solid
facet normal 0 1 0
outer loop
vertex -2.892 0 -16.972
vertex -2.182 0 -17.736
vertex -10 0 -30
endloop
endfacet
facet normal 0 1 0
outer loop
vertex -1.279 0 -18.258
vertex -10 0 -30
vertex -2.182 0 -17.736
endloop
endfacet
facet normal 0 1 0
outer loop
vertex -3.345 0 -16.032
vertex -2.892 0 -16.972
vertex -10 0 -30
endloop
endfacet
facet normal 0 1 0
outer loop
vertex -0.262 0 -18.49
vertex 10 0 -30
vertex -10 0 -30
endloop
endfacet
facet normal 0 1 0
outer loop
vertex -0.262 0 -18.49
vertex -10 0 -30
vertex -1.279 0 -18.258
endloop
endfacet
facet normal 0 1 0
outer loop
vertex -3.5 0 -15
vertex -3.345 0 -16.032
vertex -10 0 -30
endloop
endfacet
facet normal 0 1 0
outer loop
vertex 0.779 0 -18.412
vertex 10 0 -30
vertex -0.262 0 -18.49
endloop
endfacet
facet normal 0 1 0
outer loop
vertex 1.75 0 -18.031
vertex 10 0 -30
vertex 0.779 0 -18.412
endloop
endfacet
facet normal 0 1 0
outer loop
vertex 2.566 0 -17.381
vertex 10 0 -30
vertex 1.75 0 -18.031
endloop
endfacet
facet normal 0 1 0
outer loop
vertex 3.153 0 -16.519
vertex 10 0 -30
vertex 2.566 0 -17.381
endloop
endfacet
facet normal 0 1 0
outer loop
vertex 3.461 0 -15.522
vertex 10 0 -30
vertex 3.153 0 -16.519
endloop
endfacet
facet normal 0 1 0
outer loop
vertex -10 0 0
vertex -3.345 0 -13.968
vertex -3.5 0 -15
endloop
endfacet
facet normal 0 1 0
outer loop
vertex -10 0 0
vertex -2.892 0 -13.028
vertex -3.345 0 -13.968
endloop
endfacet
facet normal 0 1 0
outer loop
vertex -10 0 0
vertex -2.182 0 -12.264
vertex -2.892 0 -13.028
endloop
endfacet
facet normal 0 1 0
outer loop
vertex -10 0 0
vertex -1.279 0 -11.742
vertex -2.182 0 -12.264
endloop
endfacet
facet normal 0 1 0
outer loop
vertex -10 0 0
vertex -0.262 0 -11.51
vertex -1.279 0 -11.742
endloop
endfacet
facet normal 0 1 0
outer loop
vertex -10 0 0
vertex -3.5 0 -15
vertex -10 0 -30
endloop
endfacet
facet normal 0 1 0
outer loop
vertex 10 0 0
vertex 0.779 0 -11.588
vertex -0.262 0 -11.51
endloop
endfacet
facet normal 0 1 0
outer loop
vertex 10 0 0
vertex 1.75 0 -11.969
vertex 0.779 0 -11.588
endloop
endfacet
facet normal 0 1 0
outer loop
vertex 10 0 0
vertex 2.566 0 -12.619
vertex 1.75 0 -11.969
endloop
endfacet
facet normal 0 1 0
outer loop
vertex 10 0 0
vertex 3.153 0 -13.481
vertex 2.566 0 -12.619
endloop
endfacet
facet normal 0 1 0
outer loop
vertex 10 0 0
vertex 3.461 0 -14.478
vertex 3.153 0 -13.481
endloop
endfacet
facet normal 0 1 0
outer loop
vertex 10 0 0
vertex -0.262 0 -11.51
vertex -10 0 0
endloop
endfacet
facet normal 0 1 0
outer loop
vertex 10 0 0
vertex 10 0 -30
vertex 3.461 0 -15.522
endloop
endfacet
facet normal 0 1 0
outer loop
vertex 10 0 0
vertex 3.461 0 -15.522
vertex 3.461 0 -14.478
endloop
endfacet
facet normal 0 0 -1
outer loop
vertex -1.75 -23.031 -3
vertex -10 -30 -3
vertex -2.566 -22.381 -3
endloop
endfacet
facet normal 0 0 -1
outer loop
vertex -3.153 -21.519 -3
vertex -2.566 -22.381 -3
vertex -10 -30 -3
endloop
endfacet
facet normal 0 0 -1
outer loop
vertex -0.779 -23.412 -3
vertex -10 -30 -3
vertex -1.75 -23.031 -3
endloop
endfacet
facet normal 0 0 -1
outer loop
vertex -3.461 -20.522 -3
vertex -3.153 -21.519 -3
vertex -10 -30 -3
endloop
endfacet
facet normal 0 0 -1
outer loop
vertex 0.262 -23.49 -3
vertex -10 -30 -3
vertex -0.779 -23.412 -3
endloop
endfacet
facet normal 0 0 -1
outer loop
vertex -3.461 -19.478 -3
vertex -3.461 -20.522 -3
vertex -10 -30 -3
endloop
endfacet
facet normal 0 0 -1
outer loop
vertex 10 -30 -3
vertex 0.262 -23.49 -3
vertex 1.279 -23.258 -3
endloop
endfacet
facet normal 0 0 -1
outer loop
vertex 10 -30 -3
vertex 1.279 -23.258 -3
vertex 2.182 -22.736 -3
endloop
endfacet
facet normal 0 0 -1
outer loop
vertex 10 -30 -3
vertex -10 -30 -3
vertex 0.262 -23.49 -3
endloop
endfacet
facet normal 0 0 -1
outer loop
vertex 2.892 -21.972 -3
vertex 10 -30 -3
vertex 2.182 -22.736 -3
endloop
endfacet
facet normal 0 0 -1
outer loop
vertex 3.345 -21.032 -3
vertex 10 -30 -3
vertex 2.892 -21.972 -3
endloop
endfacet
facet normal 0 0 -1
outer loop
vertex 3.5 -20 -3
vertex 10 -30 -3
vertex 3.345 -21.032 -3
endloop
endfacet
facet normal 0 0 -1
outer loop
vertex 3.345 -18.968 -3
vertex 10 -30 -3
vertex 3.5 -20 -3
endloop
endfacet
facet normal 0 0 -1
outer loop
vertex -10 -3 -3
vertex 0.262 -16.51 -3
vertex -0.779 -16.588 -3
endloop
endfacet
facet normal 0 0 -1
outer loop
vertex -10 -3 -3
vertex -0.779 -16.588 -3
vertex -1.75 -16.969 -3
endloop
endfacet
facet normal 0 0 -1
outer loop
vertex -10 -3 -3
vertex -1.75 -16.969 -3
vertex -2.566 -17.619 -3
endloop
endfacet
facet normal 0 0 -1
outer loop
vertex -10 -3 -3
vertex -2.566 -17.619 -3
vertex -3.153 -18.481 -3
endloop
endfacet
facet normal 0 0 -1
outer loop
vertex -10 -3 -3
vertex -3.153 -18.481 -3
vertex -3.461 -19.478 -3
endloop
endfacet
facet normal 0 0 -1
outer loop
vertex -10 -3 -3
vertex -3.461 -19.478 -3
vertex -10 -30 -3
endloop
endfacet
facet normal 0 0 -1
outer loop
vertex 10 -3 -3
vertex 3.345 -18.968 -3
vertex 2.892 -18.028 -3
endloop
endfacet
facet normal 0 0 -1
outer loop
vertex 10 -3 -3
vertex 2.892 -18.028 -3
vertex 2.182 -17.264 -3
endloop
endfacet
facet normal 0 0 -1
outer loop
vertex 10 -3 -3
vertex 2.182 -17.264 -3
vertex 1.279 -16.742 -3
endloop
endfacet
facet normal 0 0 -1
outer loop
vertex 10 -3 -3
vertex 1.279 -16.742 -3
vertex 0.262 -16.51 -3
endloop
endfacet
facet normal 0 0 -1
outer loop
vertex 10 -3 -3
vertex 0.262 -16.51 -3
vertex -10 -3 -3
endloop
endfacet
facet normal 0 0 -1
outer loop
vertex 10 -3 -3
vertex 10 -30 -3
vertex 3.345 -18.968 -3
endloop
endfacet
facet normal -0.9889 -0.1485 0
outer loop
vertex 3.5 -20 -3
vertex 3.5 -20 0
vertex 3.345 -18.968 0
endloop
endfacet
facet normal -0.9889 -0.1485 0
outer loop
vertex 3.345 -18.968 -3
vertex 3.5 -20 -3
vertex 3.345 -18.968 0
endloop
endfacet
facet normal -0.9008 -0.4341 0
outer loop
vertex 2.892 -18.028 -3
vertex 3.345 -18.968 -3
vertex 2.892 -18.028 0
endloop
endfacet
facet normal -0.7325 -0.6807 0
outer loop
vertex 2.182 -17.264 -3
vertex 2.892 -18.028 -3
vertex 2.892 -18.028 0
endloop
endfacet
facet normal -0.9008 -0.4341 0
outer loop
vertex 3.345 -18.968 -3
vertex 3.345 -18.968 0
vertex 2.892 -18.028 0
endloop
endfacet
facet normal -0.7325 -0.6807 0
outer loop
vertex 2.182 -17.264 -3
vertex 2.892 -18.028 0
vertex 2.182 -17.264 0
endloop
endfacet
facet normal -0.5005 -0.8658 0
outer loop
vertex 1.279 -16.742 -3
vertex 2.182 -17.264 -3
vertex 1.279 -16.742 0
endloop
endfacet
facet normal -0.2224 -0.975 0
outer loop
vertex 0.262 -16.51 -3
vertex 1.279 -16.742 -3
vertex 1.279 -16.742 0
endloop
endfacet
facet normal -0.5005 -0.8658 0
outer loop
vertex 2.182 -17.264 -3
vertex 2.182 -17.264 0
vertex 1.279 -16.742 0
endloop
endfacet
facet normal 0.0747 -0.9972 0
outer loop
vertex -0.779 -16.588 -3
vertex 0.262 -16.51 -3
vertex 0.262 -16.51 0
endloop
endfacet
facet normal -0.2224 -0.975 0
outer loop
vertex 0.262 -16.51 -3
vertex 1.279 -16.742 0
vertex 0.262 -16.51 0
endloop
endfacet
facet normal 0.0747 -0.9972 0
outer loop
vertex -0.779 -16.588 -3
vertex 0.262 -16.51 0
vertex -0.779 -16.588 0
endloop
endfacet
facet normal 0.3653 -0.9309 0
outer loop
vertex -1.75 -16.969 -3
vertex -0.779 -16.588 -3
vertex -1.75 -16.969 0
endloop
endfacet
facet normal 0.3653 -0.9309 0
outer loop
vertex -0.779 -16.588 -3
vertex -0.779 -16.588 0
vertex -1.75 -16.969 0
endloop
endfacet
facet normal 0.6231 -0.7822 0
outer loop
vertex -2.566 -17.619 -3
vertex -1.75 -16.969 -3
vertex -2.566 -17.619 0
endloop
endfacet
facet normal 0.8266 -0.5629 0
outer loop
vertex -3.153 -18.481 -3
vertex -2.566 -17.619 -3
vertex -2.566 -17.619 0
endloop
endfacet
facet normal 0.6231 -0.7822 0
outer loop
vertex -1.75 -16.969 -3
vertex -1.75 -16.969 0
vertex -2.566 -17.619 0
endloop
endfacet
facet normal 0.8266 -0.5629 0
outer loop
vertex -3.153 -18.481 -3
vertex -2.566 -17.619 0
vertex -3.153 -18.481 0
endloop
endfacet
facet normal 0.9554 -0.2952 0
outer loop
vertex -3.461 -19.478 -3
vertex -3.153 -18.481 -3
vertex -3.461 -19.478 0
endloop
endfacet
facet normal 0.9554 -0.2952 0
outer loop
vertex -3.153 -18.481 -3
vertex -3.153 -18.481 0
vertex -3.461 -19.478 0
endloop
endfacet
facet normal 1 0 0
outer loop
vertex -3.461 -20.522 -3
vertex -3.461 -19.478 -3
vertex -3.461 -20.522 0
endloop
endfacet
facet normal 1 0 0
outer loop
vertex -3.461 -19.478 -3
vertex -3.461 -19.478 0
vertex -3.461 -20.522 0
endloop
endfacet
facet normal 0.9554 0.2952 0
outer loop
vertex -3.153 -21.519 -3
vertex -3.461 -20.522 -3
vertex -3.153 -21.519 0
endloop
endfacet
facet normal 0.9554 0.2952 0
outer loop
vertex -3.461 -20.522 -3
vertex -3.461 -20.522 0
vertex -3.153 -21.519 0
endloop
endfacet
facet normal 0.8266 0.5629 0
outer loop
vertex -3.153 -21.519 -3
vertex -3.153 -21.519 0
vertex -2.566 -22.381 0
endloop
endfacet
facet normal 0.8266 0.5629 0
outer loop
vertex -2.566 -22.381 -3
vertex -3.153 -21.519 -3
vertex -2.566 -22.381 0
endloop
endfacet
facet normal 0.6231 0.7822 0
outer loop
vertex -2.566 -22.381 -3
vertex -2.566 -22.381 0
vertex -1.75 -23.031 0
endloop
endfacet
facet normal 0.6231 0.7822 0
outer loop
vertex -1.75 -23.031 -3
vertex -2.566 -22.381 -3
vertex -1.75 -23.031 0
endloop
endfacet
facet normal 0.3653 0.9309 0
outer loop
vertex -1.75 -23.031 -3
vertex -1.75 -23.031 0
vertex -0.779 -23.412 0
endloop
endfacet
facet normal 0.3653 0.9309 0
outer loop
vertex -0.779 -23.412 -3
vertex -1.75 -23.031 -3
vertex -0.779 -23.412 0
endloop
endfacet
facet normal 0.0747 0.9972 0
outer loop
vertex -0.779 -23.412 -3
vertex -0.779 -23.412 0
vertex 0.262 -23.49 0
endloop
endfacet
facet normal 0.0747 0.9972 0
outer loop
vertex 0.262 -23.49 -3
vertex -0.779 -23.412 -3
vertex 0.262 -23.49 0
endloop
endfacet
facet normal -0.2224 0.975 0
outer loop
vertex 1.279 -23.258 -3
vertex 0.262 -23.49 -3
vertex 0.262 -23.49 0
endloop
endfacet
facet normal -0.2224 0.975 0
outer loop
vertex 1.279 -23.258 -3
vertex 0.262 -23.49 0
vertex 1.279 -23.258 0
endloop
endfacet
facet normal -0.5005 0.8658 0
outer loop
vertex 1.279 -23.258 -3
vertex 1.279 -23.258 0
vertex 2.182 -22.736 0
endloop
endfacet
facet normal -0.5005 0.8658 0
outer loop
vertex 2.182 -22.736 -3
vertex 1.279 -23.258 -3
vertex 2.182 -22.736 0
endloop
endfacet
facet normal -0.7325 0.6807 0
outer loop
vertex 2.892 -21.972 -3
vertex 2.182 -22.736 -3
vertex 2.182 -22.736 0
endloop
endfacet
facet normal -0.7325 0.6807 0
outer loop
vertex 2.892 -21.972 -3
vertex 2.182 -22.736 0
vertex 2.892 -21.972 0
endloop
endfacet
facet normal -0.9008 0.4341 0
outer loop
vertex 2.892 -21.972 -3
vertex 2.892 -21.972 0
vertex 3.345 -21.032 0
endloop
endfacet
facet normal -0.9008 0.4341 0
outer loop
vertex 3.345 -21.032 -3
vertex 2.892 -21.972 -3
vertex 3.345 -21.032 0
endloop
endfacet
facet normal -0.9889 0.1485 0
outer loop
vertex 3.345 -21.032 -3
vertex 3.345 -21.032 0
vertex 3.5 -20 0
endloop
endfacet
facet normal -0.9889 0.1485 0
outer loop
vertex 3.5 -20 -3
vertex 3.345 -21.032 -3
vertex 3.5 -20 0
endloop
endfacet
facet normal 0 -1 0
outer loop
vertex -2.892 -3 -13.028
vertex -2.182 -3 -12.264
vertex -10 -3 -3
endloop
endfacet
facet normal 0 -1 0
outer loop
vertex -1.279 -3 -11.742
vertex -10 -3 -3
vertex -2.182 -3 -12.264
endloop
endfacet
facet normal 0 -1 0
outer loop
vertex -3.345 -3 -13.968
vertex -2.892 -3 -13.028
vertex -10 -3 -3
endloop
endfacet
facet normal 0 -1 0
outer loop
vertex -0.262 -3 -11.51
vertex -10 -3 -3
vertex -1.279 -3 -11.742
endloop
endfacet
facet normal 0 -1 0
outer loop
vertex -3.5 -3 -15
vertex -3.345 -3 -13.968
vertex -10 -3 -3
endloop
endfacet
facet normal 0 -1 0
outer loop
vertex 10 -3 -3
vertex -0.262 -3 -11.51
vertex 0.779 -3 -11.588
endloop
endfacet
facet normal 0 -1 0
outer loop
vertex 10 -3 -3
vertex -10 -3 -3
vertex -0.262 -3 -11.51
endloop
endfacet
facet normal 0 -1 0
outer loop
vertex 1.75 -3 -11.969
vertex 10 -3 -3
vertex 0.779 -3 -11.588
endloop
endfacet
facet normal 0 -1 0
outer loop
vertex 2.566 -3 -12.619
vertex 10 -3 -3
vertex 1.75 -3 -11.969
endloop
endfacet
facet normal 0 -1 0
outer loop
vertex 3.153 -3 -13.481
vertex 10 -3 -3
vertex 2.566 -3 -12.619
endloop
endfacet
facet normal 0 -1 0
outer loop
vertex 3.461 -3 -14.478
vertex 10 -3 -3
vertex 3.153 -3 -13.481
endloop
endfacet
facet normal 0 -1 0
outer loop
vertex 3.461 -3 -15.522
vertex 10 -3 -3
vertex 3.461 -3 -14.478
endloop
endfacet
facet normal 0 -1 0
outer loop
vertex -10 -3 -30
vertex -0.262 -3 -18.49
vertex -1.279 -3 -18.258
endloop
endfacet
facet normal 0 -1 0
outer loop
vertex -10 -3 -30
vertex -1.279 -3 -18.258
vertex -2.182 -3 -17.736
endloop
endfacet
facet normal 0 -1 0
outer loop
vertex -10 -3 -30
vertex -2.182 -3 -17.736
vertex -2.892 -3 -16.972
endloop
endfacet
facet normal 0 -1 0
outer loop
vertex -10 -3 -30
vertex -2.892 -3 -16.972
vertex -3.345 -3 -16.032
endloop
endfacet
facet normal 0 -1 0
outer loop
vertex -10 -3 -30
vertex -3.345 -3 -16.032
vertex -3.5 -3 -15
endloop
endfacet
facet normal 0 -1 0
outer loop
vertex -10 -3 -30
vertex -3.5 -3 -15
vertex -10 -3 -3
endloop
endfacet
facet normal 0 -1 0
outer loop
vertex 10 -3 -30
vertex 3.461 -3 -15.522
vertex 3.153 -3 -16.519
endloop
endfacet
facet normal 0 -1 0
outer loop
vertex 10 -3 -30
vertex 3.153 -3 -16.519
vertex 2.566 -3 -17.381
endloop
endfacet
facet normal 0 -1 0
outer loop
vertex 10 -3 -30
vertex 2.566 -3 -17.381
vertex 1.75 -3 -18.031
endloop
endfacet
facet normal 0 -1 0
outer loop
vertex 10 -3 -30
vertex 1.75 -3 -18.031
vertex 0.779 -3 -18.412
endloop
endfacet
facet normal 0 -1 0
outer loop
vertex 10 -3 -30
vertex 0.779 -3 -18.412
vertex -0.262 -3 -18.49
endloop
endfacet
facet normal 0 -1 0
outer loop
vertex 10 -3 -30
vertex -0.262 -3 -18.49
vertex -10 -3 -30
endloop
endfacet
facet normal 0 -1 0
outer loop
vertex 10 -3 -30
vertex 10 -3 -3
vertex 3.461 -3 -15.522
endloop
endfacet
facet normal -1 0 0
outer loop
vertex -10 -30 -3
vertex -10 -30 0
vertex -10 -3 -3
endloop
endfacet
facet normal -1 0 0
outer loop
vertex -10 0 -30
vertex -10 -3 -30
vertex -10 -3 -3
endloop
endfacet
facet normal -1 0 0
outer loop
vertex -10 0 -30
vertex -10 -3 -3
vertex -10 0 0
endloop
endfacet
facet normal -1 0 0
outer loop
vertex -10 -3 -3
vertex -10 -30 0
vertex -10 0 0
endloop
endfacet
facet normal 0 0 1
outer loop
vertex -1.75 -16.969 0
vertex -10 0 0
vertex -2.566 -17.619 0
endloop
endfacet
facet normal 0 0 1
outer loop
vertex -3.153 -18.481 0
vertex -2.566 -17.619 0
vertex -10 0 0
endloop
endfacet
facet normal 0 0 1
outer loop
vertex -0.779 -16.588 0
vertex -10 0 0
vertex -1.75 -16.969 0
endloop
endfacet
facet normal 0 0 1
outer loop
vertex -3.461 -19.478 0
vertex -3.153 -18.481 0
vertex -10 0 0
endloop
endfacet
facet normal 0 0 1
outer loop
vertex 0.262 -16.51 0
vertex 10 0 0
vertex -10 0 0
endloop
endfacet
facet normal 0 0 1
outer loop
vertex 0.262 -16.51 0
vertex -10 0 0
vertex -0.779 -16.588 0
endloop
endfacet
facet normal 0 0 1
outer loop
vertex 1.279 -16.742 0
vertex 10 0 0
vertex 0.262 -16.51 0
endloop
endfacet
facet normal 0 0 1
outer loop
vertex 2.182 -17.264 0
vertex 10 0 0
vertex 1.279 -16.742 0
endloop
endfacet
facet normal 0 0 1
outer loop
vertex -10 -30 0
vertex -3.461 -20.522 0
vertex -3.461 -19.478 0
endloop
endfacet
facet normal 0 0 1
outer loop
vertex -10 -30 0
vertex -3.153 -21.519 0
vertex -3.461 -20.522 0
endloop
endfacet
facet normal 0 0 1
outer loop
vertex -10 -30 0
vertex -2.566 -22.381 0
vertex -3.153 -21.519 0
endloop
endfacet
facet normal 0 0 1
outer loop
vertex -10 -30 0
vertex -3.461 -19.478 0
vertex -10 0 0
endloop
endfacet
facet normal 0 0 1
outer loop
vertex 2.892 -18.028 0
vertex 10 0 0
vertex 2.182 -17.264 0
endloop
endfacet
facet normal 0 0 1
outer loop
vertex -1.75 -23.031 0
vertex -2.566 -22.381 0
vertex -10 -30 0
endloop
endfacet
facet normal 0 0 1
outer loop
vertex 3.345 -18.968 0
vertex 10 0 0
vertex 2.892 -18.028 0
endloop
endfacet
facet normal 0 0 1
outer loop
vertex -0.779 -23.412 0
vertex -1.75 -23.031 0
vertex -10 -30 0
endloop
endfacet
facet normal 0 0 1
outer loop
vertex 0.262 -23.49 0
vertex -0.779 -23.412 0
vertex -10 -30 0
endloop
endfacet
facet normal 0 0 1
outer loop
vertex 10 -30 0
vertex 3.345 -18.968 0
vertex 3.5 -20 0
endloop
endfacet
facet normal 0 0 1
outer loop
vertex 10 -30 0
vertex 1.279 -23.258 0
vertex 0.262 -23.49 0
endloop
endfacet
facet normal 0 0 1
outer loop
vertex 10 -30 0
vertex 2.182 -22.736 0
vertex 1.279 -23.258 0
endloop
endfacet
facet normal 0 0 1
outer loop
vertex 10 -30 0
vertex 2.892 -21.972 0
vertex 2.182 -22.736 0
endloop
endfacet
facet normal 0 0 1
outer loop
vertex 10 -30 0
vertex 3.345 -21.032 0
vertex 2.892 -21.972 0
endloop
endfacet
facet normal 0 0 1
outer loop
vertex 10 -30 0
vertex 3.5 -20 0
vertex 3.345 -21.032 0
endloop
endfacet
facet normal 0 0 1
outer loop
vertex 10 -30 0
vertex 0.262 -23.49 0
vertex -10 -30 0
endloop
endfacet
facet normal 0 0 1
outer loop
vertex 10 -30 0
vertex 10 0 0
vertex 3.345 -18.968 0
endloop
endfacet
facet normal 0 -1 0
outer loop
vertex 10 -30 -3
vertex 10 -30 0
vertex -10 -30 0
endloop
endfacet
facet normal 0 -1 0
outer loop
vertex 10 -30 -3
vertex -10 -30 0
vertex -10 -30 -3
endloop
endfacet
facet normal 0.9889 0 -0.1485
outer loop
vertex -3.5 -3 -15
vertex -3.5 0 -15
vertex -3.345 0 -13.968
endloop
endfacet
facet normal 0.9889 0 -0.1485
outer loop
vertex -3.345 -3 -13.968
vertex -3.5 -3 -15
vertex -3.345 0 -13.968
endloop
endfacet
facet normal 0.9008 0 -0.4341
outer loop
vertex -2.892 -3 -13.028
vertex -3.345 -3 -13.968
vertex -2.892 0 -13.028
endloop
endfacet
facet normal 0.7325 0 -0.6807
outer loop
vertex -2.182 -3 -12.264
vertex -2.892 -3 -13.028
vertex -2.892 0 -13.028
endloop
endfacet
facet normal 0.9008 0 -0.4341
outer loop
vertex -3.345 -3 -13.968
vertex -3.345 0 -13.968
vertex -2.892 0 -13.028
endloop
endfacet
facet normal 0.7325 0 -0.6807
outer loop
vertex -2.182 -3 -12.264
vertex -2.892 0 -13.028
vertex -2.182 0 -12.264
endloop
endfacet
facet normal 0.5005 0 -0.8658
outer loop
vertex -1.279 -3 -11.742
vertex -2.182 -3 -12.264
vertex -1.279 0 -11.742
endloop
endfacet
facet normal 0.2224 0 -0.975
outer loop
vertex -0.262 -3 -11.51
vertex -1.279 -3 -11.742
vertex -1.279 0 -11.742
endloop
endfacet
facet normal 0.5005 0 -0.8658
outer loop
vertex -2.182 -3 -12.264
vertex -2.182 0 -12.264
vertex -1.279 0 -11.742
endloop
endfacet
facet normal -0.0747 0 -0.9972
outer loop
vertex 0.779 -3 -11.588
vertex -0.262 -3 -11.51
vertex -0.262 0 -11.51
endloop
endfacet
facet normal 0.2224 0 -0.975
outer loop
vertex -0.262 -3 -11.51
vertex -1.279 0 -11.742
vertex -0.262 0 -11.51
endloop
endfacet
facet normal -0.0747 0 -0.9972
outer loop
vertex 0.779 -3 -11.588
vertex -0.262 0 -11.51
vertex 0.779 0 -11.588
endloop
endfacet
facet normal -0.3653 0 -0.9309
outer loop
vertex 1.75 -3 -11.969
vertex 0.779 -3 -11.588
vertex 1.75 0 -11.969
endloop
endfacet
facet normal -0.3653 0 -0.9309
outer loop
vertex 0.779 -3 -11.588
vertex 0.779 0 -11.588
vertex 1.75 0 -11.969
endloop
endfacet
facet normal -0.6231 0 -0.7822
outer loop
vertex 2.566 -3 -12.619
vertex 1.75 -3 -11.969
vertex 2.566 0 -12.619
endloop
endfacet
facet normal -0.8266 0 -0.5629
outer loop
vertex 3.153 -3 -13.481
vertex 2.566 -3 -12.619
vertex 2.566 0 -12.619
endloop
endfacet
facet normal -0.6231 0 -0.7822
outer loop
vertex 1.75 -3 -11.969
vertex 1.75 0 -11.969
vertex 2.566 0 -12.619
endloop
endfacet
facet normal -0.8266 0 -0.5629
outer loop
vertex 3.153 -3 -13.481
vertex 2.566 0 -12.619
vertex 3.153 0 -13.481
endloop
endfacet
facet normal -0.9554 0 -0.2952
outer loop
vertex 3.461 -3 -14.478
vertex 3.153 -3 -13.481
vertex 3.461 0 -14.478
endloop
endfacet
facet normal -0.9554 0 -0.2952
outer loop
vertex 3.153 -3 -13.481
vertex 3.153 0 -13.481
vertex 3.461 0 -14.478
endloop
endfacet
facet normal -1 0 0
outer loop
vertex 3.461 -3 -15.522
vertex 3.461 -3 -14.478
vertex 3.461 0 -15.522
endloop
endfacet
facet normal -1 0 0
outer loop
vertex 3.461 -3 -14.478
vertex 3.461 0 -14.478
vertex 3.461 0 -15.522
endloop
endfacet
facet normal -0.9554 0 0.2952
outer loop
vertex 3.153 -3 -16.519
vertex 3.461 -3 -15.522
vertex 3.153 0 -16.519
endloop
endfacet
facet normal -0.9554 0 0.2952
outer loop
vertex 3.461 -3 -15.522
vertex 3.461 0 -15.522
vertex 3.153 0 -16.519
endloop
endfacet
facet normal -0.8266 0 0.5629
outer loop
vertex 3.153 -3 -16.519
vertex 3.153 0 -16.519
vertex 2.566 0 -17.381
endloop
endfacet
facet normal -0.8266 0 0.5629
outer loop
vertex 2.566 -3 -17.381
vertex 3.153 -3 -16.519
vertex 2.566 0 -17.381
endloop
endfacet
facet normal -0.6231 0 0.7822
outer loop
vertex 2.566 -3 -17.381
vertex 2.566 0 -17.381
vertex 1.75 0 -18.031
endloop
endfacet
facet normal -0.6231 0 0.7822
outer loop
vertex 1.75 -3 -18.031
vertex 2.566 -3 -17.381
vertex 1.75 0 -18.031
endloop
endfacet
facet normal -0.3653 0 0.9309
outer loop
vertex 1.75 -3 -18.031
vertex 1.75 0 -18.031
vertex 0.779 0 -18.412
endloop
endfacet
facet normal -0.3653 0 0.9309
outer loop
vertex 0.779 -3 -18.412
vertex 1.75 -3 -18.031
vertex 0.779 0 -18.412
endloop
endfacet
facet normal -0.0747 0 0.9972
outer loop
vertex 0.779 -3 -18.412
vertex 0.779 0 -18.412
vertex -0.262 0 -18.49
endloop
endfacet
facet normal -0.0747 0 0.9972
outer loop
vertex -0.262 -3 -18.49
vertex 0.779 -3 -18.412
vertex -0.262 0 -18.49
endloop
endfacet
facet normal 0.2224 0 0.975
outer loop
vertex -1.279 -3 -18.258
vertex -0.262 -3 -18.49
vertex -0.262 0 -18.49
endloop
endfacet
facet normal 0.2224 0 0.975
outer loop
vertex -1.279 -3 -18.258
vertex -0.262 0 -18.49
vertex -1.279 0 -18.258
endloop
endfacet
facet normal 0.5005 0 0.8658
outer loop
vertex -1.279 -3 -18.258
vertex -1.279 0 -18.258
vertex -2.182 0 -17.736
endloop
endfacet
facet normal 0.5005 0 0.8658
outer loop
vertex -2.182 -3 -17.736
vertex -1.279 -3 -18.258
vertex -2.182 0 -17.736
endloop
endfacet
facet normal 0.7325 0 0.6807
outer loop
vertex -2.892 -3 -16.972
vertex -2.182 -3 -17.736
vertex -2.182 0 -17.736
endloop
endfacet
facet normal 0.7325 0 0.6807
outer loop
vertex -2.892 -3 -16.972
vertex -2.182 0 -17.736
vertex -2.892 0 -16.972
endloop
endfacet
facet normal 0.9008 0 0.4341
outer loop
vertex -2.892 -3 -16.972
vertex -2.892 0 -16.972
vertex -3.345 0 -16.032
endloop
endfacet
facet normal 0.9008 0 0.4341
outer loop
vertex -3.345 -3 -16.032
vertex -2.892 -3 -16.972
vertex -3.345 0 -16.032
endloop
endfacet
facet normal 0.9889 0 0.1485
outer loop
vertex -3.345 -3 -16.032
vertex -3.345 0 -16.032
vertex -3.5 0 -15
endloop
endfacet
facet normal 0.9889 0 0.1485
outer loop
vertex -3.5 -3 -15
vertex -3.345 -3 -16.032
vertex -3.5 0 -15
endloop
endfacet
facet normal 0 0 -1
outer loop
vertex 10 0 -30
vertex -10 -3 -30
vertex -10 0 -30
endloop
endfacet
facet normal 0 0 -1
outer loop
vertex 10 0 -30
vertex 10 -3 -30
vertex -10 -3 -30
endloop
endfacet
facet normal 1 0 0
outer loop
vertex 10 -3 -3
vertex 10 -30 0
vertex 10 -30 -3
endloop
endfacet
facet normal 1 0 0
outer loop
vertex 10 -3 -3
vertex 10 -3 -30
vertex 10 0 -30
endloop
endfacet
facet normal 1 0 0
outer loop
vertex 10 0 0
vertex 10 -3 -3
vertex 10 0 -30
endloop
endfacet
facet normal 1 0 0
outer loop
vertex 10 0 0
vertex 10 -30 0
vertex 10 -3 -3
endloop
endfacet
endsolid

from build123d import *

# Parameters (mm, degrees)
F1_DEPTH = 10
F2_R     = 3.5
F3_DEPTH = 30.001
F4_R     = 3.5
F5_DEPTH = 30.001


with BuildPart() as f1:
    # F0 (on Right) → F1 (new body, symmetric)
    with BuildSketch(Plane.YZ):
        Polygon((0, 0), (-30, 0), (-30, -3), (-3, -3), (-3, -30), (0, -30), align=None)
    extrude(amount=F1_DEPTH, both=True)

    # F2 (on face) → F3 (cut, through all)
    with BuildSketch(Plane(origin=(0, 0, 0), x_dir=(-1, 0, 0), z_dir=(0, 1, 0))):
        with Locations((0, -15)):
            Circle(F2_R)
    extrude(amount=-F3_DEPTH, mode=Mode.SUBTRACT)

    # F4 (on face) → F5 (cut, through all)
    with BuildSketch(Plane.XY):
        with Locations((0, -20)):
            Circle(F4_R)
    extrude(amount=-F5_DEPTH, mode=Mode.SUBTRACT)


solid = f1.part
